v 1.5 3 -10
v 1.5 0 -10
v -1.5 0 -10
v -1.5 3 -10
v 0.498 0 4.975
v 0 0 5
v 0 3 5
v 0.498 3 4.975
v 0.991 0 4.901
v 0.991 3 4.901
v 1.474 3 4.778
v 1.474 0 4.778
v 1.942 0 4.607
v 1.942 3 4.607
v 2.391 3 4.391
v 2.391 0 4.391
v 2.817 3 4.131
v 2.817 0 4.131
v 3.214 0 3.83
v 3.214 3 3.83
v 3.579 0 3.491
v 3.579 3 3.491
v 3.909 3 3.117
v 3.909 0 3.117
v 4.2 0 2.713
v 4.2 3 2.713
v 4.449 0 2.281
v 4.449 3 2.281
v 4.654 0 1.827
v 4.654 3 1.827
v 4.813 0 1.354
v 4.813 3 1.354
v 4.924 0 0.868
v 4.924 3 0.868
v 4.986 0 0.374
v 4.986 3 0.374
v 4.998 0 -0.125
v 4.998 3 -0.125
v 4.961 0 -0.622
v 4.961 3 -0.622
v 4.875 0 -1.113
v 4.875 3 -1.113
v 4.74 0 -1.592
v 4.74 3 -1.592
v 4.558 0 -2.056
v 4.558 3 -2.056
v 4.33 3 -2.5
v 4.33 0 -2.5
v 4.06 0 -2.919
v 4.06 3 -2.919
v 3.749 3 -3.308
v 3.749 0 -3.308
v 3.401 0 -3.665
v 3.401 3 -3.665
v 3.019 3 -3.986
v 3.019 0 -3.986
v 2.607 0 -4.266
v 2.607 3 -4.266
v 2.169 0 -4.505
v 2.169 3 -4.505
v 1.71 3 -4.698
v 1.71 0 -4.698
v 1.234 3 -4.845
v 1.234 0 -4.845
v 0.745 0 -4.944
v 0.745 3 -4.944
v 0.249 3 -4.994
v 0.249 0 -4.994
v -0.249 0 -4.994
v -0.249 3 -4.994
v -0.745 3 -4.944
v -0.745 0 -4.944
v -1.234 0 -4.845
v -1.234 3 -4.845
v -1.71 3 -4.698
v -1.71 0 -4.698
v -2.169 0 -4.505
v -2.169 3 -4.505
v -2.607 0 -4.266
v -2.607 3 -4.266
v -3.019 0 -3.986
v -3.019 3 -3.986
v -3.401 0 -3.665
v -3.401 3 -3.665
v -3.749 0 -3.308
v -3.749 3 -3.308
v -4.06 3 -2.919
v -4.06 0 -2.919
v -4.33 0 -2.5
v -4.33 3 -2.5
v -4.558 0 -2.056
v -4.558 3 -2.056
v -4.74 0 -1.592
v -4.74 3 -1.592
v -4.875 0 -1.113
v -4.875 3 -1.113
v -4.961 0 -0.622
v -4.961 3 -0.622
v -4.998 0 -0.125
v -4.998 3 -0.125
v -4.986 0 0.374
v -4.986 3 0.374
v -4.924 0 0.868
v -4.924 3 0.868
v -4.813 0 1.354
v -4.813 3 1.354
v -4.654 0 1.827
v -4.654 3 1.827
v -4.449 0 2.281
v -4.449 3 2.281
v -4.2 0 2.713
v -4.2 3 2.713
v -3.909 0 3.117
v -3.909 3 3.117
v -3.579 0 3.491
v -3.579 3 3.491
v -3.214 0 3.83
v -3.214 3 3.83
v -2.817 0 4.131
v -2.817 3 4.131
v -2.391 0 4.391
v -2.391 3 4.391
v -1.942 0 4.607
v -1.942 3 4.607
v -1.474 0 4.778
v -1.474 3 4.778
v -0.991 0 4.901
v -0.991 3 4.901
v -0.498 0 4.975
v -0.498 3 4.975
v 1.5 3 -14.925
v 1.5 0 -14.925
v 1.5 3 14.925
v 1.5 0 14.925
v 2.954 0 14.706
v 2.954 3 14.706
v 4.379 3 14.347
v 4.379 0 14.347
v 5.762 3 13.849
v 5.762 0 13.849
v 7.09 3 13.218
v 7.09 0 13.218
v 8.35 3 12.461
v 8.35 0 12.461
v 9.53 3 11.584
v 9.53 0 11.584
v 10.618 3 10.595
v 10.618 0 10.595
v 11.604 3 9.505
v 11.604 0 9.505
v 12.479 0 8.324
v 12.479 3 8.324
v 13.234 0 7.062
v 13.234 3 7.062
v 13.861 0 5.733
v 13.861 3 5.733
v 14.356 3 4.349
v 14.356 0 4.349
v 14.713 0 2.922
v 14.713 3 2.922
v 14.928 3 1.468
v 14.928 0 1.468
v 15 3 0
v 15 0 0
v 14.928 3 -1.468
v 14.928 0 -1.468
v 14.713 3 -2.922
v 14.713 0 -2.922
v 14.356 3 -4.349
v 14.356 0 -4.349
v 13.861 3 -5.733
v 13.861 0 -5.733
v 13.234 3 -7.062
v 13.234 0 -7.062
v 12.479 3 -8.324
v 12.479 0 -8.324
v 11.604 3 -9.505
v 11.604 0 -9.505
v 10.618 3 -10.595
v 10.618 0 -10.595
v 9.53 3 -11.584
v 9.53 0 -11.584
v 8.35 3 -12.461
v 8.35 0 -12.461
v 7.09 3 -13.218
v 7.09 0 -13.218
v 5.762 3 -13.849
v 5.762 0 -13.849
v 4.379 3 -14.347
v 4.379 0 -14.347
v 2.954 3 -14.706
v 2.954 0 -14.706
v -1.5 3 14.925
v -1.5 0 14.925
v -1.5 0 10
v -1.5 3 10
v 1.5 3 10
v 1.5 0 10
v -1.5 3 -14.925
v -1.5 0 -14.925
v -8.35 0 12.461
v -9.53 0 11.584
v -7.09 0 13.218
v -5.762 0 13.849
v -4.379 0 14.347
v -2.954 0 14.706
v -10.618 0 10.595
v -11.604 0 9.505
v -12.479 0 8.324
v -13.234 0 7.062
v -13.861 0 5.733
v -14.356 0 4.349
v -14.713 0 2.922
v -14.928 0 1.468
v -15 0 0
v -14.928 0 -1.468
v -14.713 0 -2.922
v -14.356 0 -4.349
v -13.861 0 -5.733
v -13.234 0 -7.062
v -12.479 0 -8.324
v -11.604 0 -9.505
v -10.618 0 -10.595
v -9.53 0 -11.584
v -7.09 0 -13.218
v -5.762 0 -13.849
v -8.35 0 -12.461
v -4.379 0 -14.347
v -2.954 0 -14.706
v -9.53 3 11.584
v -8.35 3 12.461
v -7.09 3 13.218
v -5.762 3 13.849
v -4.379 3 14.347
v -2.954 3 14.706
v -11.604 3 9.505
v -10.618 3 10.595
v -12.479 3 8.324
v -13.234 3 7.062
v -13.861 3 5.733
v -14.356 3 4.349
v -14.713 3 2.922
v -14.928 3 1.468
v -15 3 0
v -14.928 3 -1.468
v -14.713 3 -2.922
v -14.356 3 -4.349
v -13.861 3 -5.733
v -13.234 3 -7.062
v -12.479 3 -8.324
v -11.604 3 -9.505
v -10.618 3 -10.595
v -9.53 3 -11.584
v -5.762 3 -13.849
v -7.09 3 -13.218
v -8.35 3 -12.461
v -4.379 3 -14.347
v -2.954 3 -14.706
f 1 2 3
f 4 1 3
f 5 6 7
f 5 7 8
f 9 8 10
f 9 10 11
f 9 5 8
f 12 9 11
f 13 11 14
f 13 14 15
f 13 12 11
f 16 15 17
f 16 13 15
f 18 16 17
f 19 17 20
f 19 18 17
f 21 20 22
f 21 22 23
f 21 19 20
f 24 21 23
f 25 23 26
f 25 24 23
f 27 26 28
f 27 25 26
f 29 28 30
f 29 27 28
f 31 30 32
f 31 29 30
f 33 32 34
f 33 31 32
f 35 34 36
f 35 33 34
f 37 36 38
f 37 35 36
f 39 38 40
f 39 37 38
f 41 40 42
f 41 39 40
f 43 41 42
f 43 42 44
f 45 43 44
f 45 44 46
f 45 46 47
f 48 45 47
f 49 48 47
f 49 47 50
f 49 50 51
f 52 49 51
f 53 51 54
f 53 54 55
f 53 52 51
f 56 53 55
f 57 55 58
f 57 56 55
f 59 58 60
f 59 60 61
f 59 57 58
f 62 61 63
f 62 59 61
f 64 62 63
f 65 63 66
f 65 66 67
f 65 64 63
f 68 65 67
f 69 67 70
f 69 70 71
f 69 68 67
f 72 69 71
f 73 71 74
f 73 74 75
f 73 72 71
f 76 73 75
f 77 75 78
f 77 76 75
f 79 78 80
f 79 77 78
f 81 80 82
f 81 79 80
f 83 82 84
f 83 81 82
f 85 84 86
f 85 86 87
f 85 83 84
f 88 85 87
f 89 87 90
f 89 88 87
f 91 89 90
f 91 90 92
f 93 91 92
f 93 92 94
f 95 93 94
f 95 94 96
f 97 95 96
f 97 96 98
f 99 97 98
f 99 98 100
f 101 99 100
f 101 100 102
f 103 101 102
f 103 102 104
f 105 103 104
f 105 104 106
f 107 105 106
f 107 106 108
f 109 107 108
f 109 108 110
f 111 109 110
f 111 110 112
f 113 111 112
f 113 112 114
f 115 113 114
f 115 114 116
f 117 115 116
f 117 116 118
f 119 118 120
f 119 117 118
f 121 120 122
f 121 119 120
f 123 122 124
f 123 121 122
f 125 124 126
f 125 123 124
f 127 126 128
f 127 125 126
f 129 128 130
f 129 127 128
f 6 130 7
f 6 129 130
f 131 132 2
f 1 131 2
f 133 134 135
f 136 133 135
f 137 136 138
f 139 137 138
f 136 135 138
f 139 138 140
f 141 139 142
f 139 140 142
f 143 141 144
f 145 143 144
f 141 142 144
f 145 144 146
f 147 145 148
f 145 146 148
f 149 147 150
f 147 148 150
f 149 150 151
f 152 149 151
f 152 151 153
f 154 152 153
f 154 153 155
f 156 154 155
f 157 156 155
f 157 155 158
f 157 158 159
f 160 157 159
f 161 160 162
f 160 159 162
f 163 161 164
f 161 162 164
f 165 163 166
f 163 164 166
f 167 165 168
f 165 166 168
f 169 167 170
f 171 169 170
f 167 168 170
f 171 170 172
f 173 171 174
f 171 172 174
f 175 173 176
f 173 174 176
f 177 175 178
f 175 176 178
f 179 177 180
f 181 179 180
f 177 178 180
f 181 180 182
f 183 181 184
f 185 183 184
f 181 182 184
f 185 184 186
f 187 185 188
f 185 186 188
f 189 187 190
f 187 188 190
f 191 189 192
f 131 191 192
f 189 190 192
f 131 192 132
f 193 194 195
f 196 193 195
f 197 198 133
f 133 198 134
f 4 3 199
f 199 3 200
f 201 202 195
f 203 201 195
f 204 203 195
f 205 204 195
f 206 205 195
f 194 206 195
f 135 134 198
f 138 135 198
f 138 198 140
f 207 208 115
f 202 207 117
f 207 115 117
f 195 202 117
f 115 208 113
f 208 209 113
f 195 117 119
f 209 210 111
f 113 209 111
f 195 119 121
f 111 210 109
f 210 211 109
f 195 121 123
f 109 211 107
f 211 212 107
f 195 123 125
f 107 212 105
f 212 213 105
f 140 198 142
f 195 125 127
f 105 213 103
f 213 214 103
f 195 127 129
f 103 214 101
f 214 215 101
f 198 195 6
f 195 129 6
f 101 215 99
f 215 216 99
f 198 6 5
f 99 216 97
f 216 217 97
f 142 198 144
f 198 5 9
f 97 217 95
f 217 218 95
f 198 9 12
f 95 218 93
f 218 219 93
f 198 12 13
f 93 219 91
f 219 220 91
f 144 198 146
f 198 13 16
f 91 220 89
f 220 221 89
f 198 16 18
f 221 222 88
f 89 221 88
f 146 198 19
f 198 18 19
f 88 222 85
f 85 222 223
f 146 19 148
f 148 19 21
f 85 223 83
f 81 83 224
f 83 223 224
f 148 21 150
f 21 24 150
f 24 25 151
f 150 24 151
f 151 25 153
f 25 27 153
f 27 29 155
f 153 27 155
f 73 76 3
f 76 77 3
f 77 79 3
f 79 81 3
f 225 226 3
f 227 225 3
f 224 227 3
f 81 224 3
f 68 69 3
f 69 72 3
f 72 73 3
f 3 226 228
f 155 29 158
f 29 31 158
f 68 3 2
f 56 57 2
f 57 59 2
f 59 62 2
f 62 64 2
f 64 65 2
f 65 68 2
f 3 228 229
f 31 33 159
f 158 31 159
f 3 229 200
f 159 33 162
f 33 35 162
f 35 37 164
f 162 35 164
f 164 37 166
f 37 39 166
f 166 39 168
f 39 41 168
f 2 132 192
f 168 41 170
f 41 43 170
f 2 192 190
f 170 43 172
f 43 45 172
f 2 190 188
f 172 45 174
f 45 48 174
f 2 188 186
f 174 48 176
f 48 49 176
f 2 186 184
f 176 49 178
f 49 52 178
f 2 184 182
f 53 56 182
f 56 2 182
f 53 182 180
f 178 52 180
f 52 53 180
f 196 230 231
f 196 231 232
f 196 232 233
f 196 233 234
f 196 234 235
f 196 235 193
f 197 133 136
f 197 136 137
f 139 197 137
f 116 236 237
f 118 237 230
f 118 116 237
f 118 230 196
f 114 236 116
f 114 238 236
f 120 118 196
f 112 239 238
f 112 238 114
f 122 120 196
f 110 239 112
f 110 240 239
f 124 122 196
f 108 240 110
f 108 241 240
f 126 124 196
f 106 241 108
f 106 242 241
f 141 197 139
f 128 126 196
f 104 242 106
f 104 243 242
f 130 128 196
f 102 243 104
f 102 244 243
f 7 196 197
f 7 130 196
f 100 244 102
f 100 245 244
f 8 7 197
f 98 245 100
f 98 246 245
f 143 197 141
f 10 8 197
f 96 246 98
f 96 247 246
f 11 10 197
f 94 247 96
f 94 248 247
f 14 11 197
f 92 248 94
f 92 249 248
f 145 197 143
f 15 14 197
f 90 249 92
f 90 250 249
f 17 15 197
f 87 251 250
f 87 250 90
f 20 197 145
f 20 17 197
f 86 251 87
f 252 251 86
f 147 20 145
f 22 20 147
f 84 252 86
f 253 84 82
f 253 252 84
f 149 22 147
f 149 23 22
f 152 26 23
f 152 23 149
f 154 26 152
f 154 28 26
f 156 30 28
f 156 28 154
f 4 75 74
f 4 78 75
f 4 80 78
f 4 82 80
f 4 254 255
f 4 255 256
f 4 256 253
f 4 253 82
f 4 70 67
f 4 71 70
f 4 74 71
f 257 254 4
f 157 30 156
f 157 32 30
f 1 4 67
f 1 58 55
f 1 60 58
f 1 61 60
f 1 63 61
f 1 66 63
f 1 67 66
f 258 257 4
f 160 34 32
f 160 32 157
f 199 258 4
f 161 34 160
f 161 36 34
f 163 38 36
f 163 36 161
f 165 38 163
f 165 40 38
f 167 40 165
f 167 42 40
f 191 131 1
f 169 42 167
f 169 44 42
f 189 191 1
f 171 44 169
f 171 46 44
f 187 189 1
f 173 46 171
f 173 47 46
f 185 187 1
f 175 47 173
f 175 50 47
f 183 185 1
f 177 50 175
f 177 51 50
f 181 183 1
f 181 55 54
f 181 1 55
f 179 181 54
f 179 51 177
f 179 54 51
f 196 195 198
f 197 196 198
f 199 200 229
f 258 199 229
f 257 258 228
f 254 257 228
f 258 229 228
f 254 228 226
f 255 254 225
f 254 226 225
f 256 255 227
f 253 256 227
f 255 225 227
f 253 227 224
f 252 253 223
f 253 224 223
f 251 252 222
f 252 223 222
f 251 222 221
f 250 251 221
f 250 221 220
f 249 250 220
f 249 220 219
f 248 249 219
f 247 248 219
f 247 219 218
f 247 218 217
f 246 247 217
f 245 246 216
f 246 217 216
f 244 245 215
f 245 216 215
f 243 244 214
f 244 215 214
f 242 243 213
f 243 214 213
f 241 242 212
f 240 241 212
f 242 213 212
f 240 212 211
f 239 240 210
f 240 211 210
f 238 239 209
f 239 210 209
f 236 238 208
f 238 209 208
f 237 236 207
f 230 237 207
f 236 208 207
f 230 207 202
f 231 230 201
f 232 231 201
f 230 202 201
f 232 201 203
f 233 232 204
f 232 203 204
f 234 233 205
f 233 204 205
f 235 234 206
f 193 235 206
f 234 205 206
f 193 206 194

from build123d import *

# Parameters (mm, degrees)
SKETCH_1_R      = 5
EXTRUDE_1_DEPTH = 3


with BuildPart() as part:
    # 草图1 → 凸台-拉伸1 (new body)
    with BuildSketch(Plane(origin=(0, 0, 0), x_dir=(1, 0, 0), z_dir=(0, 1, 0))):
        with BuildLine():
            Line((-1.5, -14.924811557), (-1.5, -10))
            Line((-1.5, -10), (1.5, -10))
            Line((1.5, -10), (1.5, -14.924811557))
            ThreePointArc((1.5, -14.924811557), (15, 0), (1.5, 14.924811557))
            Line((1.5, 14.924811557), (1.5, 10))
            Line((1.5, 10), (-1.5, 10))
            Line((-1.5, 10), (-1.5, 14.924811557))
            ThreePointArc((-1.5, 14.924811557), (-15, 0), (-1.5, -14.924811557))
        make_face()
        with Locations(Location((0, 0, 0), (0, 0, 270))):
            Circle(SKETCH_1_R, mode=Mode.SUBTRACT)
    extrude(amount=EXTRUDE_1_DEPTH)


solid = part.part
